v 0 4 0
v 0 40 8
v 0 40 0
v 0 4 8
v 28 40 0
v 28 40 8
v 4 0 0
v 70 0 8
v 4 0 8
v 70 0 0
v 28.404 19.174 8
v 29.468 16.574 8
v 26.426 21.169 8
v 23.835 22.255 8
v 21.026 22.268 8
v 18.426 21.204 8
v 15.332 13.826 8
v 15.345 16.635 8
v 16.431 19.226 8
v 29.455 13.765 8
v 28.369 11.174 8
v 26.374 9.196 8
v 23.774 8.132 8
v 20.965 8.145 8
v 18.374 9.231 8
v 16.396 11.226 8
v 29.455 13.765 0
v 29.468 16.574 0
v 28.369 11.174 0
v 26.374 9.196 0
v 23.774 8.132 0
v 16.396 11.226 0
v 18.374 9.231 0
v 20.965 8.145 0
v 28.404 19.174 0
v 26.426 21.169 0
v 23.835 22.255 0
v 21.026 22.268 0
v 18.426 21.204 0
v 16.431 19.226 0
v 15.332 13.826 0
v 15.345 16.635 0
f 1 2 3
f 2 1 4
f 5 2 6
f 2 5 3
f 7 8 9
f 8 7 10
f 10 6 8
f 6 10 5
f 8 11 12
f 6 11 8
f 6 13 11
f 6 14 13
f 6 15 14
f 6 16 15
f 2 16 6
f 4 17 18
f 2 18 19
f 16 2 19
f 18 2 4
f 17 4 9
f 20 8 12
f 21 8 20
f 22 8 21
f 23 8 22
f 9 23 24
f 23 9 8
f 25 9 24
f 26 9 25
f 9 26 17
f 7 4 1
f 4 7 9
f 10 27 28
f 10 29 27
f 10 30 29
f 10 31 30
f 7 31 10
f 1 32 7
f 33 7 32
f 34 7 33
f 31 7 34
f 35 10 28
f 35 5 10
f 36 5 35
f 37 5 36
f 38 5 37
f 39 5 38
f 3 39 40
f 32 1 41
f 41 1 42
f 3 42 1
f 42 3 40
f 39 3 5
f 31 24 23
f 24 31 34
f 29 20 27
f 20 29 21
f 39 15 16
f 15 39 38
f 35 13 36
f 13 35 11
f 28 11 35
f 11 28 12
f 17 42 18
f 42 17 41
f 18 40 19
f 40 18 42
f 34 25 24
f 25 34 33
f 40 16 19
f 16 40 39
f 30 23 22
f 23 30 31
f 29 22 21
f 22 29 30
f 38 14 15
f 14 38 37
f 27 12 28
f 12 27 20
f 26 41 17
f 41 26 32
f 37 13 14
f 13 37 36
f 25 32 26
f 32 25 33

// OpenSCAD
$fn = 32;

// ----------------------------------------------------------------------
// Bracket plate: gusset 70 x 40
// ----------------------------------------------------------------------

// --- parameters (mm) ---
hole_r = 3.5;             // bolt hole radius
plate_t = 8;              // plate thickness, Z (extrusion height)
gus_a = 70;               // base length
gus_b = 40;               // height
top_x = 28;               // top edge X of the angled cut
light_r = 7.2;            // lightening hole radius

light_d = 2 * light_r;

profile = [[4, 0], [35, 0], [70, 0], [28, 40], [0, 40], [0, 4]];  // primary outline, 6 points, counter clockwise
void_1 = [[29.468, 16.574], [28.404, 19.174], [26.426, 21.169], [23.835, 22.255], [21.026, 22.268], [18.426, 21.204], [16.431, 19.226], [15.345, 16.635], [15.332, 13.826], [16.396, 11.226], [18.374, 9.231], [20.965, 8.145], [23.774, 8.132], [26.374, 9.196], [28.369, 11.174], [29.455, 13.765]];  // lightening hole, 16 points

// --- the one profile operation ---
difference() {
  linear_extrude(height = plate_t) polygon(points = profile);
  translate([0, 0, -1])
    linear_extrude(height = plate_t + 2) polygon(points = void_1);
}
